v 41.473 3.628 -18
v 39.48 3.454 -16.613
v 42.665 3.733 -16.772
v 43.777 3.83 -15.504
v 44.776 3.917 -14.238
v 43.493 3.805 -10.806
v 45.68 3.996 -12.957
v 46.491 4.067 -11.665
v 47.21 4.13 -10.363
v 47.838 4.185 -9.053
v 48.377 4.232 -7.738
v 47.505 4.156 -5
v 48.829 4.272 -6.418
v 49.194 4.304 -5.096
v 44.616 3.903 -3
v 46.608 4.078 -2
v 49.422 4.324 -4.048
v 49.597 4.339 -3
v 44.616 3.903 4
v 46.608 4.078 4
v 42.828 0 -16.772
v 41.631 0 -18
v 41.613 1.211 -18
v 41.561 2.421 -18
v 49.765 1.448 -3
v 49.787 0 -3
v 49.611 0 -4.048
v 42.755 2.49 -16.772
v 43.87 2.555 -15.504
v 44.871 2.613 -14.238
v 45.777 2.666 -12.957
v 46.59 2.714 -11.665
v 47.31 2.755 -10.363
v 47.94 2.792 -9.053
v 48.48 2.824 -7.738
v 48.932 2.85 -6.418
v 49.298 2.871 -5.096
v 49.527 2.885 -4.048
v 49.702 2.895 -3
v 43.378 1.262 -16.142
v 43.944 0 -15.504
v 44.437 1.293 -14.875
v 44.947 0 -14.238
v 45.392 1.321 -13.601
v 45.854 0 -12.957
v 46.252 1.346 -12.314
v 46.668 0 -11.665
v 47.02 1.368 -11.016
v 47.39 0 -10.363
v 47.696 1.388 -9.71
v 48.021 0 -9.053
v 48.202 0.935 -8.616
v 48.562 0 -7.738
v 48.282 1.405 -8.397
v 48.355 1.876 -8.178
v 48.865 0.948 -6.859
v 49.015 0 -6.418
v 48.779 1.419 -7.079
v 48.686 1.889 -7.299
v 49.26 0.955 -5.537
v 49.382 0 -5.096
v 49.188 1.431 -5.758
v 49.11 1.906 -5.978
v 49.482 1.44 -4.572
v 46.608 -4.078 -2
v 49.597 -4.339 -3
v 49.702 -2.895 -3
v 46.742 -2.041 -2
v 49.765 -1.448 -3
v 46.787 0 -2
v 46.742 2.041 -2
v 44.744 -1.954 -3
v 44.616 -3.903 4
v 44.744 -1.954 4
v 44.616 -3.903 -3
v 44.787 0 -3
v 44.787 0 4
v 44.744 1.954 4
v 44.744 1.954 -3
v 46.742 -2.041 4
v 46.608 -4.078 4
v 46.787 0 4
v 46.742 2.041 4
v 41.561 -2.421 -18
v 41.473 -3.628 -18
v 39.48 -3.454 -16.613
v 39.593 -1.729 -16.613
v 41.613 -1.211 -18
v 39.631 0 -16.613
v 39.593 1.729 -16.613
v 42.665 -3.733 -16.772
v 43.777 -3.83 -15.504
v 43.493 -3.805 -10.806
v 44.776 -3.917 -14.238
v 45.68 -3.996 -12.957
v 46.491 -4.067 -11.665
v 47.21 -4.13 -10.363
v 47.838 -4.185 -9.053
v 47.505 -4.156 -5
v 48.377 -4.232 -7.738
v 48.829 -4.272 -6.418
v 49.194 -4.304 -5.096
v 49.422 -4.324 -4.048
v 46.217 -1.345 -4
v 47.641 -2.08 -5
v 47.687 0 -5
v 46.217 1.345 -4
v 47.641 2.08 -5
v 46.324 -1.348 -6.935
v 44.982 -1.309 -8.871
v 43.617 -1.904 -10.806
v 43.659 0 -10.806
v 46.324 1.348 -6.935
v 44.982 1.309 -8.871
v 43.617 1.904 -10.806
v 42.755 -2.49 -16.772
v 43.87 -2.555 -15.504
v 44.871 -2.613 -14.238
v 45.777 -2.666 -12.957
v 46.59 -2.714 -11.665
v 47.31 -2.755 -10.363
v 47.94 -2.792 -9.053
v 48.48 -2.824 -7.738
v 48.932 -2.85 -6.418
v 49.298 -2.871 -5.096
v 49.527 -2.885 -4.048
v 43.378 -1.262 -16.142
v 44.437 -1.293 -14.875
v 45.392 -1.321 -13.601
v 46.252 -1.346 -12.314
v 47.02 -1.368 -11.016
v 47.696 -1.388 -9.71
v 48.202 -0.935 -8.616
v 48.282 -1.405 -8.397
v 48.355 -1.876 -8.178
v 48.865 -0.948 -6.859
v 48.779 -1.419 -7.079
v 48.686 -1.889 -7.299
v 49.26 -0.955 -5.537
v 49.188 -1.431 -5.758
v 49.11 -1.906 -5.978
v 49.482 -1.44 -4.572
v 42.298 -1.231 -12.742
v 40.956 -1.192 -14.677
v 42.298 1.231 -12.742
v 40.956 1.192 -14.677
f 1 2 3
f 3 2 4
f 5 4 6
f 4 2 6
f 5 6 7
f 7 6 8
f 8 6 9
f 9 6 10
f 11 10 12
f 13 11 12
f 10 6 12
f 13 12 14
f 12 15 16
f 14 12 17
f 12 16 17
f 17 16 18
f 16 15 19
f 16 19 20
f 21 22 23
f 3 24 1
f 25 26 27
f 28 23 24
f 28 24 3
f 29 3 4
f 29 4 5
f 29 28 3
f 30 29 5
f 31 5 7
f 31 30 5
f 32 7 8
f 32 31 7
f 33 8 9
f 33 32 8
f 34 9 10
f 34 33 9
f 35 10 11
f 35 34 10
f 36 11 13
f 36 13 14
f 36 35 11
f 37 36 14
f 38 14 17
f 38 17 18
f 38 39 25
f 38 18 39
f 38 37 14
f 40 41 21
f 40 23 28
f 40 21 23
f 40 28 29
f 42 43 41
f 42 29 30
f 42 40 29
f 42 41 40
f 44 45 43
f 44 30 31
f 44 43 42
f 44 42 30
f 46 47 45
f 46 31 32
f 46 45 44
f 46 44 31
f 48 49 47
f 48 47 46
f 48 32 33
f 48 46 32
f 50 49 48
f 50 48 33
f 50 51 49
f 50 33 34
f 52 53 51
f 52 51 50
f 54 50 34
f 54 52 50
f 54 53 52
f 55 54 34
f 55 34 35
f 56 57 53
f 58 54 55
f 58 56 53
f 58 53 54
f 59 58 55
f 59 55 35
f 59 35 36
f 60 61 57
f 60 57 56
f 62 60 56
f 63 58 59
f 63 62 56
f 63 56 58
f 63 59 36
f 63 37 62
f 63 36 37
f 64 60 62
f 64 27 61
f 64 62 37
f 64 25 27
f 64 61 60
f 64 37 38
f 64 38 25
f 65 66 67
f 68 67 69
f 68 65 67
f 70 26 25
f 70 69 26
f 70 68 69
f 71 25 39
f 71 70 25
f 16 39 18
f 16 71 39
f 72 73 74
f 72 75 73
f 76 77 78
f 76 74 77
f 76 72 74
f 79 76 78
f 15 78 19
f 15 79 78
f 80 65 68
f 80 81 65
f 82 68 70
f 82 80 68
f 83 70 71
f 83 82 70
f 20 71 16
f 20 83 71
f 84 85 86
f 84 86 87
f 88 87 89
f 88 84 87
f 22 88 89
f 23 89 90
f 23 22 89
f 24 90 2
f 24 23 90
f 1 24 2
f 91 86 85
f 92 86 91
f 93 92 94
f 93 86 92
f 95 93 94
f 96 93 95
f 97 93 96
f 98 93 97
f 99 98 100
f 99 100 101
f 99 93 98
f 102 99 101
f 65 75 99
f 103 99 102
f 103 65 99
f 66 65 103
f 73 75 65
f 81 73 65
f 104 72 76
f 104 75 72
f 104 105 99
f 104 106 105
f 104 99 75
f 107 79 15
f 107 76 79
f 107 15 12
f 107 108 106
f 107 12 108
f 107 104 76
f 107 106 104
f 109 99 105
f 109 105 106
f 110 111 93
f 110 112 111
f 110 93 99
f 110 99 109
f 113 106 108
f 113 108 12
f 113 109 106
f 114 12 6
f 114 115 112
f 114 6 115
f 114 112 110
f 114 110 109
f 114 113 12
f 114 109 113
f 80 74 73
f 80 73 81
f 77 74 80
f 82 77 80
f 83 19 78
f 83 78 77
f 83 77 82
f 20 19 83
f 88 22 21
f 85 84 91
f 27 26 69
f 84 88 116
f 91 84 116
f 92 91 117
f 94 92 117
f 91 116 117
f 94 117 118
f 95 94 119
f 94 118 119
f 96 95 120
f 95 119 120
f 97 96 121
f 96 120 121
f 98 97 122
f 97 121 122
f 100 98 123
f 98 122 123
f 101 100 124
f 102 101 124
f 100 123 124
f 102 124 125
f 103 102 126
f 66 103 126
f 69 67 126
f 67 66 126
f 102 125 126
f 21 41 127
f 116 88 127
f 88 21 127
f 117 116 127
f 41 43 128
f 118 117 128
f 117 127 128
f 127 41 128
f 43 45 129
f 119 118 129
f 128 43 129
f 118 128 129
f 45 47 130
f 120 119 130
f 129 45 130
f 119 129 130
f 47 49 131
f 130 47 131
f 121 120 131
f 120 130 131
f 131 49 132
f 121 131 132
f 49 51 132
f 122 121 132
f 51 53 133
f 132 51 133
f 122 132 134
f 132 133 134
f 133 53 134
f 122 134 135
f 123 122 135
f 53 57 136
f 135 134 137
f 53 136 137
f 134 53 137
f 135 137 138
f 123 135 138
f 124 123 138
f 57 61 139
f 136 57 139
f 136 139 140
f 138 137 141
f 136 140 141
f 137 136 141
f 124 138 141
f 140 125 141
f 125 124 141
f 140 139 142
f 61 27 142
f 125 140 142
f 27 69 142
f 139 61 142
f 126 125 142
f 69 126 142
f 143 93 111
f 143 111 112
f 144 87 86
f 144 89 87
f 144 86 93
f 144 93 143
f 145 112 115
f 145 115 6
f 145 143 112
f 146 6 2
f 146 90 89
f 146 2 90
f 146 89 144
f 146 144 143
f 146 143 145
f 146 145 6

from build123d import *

# Parameters (mm, degrees)
F1_ANGLE = 10


with BuildPart() as f1:
    # F0 (on Front) → F1 (revolve, symmetric)
    with BuildSketch(Plane.XZ) as f1_sk:
        with BuildLine():
            Line((39.630951, -16.612617), (41.630951, -18))
            add(Edge.make_bspline(
                [(41.630951, -18), (48.621444, -11.169093), (49.786527, -3)],
                knots=[5.696209, 5.696209, 5.696209, 6.190746, 6.190746, 6.190746], degree=2, weights=[1, 0.969585, 1]))
            Line((49.786527, -3), (46.786527, -2))
            Line((46.786527, -2), (46.786527, 4))
            Line((46.786527, 4), (44.786527, 4))
            Line((44.786527, 4), (44.786527, -3))
            Line((44.786527, -3), (47.686527, -5))
            Line((47.686527, -5), (43.658739, -10.806308))
            Line((43.658739, -10.806308), (39.630951, -16.612617))
        make_face()
    revolve(axis=Axis((0, 0, 2.169164), (0, 0, -1)), revolution_arc=F1_ANGLE / 2)
    revolve(f1_sk.sketch, axis=Axis((0, 0, 2.169164), (0, 0, 1)), revolution_arc=F1_ANGLE / 2)


solid = f1.part
